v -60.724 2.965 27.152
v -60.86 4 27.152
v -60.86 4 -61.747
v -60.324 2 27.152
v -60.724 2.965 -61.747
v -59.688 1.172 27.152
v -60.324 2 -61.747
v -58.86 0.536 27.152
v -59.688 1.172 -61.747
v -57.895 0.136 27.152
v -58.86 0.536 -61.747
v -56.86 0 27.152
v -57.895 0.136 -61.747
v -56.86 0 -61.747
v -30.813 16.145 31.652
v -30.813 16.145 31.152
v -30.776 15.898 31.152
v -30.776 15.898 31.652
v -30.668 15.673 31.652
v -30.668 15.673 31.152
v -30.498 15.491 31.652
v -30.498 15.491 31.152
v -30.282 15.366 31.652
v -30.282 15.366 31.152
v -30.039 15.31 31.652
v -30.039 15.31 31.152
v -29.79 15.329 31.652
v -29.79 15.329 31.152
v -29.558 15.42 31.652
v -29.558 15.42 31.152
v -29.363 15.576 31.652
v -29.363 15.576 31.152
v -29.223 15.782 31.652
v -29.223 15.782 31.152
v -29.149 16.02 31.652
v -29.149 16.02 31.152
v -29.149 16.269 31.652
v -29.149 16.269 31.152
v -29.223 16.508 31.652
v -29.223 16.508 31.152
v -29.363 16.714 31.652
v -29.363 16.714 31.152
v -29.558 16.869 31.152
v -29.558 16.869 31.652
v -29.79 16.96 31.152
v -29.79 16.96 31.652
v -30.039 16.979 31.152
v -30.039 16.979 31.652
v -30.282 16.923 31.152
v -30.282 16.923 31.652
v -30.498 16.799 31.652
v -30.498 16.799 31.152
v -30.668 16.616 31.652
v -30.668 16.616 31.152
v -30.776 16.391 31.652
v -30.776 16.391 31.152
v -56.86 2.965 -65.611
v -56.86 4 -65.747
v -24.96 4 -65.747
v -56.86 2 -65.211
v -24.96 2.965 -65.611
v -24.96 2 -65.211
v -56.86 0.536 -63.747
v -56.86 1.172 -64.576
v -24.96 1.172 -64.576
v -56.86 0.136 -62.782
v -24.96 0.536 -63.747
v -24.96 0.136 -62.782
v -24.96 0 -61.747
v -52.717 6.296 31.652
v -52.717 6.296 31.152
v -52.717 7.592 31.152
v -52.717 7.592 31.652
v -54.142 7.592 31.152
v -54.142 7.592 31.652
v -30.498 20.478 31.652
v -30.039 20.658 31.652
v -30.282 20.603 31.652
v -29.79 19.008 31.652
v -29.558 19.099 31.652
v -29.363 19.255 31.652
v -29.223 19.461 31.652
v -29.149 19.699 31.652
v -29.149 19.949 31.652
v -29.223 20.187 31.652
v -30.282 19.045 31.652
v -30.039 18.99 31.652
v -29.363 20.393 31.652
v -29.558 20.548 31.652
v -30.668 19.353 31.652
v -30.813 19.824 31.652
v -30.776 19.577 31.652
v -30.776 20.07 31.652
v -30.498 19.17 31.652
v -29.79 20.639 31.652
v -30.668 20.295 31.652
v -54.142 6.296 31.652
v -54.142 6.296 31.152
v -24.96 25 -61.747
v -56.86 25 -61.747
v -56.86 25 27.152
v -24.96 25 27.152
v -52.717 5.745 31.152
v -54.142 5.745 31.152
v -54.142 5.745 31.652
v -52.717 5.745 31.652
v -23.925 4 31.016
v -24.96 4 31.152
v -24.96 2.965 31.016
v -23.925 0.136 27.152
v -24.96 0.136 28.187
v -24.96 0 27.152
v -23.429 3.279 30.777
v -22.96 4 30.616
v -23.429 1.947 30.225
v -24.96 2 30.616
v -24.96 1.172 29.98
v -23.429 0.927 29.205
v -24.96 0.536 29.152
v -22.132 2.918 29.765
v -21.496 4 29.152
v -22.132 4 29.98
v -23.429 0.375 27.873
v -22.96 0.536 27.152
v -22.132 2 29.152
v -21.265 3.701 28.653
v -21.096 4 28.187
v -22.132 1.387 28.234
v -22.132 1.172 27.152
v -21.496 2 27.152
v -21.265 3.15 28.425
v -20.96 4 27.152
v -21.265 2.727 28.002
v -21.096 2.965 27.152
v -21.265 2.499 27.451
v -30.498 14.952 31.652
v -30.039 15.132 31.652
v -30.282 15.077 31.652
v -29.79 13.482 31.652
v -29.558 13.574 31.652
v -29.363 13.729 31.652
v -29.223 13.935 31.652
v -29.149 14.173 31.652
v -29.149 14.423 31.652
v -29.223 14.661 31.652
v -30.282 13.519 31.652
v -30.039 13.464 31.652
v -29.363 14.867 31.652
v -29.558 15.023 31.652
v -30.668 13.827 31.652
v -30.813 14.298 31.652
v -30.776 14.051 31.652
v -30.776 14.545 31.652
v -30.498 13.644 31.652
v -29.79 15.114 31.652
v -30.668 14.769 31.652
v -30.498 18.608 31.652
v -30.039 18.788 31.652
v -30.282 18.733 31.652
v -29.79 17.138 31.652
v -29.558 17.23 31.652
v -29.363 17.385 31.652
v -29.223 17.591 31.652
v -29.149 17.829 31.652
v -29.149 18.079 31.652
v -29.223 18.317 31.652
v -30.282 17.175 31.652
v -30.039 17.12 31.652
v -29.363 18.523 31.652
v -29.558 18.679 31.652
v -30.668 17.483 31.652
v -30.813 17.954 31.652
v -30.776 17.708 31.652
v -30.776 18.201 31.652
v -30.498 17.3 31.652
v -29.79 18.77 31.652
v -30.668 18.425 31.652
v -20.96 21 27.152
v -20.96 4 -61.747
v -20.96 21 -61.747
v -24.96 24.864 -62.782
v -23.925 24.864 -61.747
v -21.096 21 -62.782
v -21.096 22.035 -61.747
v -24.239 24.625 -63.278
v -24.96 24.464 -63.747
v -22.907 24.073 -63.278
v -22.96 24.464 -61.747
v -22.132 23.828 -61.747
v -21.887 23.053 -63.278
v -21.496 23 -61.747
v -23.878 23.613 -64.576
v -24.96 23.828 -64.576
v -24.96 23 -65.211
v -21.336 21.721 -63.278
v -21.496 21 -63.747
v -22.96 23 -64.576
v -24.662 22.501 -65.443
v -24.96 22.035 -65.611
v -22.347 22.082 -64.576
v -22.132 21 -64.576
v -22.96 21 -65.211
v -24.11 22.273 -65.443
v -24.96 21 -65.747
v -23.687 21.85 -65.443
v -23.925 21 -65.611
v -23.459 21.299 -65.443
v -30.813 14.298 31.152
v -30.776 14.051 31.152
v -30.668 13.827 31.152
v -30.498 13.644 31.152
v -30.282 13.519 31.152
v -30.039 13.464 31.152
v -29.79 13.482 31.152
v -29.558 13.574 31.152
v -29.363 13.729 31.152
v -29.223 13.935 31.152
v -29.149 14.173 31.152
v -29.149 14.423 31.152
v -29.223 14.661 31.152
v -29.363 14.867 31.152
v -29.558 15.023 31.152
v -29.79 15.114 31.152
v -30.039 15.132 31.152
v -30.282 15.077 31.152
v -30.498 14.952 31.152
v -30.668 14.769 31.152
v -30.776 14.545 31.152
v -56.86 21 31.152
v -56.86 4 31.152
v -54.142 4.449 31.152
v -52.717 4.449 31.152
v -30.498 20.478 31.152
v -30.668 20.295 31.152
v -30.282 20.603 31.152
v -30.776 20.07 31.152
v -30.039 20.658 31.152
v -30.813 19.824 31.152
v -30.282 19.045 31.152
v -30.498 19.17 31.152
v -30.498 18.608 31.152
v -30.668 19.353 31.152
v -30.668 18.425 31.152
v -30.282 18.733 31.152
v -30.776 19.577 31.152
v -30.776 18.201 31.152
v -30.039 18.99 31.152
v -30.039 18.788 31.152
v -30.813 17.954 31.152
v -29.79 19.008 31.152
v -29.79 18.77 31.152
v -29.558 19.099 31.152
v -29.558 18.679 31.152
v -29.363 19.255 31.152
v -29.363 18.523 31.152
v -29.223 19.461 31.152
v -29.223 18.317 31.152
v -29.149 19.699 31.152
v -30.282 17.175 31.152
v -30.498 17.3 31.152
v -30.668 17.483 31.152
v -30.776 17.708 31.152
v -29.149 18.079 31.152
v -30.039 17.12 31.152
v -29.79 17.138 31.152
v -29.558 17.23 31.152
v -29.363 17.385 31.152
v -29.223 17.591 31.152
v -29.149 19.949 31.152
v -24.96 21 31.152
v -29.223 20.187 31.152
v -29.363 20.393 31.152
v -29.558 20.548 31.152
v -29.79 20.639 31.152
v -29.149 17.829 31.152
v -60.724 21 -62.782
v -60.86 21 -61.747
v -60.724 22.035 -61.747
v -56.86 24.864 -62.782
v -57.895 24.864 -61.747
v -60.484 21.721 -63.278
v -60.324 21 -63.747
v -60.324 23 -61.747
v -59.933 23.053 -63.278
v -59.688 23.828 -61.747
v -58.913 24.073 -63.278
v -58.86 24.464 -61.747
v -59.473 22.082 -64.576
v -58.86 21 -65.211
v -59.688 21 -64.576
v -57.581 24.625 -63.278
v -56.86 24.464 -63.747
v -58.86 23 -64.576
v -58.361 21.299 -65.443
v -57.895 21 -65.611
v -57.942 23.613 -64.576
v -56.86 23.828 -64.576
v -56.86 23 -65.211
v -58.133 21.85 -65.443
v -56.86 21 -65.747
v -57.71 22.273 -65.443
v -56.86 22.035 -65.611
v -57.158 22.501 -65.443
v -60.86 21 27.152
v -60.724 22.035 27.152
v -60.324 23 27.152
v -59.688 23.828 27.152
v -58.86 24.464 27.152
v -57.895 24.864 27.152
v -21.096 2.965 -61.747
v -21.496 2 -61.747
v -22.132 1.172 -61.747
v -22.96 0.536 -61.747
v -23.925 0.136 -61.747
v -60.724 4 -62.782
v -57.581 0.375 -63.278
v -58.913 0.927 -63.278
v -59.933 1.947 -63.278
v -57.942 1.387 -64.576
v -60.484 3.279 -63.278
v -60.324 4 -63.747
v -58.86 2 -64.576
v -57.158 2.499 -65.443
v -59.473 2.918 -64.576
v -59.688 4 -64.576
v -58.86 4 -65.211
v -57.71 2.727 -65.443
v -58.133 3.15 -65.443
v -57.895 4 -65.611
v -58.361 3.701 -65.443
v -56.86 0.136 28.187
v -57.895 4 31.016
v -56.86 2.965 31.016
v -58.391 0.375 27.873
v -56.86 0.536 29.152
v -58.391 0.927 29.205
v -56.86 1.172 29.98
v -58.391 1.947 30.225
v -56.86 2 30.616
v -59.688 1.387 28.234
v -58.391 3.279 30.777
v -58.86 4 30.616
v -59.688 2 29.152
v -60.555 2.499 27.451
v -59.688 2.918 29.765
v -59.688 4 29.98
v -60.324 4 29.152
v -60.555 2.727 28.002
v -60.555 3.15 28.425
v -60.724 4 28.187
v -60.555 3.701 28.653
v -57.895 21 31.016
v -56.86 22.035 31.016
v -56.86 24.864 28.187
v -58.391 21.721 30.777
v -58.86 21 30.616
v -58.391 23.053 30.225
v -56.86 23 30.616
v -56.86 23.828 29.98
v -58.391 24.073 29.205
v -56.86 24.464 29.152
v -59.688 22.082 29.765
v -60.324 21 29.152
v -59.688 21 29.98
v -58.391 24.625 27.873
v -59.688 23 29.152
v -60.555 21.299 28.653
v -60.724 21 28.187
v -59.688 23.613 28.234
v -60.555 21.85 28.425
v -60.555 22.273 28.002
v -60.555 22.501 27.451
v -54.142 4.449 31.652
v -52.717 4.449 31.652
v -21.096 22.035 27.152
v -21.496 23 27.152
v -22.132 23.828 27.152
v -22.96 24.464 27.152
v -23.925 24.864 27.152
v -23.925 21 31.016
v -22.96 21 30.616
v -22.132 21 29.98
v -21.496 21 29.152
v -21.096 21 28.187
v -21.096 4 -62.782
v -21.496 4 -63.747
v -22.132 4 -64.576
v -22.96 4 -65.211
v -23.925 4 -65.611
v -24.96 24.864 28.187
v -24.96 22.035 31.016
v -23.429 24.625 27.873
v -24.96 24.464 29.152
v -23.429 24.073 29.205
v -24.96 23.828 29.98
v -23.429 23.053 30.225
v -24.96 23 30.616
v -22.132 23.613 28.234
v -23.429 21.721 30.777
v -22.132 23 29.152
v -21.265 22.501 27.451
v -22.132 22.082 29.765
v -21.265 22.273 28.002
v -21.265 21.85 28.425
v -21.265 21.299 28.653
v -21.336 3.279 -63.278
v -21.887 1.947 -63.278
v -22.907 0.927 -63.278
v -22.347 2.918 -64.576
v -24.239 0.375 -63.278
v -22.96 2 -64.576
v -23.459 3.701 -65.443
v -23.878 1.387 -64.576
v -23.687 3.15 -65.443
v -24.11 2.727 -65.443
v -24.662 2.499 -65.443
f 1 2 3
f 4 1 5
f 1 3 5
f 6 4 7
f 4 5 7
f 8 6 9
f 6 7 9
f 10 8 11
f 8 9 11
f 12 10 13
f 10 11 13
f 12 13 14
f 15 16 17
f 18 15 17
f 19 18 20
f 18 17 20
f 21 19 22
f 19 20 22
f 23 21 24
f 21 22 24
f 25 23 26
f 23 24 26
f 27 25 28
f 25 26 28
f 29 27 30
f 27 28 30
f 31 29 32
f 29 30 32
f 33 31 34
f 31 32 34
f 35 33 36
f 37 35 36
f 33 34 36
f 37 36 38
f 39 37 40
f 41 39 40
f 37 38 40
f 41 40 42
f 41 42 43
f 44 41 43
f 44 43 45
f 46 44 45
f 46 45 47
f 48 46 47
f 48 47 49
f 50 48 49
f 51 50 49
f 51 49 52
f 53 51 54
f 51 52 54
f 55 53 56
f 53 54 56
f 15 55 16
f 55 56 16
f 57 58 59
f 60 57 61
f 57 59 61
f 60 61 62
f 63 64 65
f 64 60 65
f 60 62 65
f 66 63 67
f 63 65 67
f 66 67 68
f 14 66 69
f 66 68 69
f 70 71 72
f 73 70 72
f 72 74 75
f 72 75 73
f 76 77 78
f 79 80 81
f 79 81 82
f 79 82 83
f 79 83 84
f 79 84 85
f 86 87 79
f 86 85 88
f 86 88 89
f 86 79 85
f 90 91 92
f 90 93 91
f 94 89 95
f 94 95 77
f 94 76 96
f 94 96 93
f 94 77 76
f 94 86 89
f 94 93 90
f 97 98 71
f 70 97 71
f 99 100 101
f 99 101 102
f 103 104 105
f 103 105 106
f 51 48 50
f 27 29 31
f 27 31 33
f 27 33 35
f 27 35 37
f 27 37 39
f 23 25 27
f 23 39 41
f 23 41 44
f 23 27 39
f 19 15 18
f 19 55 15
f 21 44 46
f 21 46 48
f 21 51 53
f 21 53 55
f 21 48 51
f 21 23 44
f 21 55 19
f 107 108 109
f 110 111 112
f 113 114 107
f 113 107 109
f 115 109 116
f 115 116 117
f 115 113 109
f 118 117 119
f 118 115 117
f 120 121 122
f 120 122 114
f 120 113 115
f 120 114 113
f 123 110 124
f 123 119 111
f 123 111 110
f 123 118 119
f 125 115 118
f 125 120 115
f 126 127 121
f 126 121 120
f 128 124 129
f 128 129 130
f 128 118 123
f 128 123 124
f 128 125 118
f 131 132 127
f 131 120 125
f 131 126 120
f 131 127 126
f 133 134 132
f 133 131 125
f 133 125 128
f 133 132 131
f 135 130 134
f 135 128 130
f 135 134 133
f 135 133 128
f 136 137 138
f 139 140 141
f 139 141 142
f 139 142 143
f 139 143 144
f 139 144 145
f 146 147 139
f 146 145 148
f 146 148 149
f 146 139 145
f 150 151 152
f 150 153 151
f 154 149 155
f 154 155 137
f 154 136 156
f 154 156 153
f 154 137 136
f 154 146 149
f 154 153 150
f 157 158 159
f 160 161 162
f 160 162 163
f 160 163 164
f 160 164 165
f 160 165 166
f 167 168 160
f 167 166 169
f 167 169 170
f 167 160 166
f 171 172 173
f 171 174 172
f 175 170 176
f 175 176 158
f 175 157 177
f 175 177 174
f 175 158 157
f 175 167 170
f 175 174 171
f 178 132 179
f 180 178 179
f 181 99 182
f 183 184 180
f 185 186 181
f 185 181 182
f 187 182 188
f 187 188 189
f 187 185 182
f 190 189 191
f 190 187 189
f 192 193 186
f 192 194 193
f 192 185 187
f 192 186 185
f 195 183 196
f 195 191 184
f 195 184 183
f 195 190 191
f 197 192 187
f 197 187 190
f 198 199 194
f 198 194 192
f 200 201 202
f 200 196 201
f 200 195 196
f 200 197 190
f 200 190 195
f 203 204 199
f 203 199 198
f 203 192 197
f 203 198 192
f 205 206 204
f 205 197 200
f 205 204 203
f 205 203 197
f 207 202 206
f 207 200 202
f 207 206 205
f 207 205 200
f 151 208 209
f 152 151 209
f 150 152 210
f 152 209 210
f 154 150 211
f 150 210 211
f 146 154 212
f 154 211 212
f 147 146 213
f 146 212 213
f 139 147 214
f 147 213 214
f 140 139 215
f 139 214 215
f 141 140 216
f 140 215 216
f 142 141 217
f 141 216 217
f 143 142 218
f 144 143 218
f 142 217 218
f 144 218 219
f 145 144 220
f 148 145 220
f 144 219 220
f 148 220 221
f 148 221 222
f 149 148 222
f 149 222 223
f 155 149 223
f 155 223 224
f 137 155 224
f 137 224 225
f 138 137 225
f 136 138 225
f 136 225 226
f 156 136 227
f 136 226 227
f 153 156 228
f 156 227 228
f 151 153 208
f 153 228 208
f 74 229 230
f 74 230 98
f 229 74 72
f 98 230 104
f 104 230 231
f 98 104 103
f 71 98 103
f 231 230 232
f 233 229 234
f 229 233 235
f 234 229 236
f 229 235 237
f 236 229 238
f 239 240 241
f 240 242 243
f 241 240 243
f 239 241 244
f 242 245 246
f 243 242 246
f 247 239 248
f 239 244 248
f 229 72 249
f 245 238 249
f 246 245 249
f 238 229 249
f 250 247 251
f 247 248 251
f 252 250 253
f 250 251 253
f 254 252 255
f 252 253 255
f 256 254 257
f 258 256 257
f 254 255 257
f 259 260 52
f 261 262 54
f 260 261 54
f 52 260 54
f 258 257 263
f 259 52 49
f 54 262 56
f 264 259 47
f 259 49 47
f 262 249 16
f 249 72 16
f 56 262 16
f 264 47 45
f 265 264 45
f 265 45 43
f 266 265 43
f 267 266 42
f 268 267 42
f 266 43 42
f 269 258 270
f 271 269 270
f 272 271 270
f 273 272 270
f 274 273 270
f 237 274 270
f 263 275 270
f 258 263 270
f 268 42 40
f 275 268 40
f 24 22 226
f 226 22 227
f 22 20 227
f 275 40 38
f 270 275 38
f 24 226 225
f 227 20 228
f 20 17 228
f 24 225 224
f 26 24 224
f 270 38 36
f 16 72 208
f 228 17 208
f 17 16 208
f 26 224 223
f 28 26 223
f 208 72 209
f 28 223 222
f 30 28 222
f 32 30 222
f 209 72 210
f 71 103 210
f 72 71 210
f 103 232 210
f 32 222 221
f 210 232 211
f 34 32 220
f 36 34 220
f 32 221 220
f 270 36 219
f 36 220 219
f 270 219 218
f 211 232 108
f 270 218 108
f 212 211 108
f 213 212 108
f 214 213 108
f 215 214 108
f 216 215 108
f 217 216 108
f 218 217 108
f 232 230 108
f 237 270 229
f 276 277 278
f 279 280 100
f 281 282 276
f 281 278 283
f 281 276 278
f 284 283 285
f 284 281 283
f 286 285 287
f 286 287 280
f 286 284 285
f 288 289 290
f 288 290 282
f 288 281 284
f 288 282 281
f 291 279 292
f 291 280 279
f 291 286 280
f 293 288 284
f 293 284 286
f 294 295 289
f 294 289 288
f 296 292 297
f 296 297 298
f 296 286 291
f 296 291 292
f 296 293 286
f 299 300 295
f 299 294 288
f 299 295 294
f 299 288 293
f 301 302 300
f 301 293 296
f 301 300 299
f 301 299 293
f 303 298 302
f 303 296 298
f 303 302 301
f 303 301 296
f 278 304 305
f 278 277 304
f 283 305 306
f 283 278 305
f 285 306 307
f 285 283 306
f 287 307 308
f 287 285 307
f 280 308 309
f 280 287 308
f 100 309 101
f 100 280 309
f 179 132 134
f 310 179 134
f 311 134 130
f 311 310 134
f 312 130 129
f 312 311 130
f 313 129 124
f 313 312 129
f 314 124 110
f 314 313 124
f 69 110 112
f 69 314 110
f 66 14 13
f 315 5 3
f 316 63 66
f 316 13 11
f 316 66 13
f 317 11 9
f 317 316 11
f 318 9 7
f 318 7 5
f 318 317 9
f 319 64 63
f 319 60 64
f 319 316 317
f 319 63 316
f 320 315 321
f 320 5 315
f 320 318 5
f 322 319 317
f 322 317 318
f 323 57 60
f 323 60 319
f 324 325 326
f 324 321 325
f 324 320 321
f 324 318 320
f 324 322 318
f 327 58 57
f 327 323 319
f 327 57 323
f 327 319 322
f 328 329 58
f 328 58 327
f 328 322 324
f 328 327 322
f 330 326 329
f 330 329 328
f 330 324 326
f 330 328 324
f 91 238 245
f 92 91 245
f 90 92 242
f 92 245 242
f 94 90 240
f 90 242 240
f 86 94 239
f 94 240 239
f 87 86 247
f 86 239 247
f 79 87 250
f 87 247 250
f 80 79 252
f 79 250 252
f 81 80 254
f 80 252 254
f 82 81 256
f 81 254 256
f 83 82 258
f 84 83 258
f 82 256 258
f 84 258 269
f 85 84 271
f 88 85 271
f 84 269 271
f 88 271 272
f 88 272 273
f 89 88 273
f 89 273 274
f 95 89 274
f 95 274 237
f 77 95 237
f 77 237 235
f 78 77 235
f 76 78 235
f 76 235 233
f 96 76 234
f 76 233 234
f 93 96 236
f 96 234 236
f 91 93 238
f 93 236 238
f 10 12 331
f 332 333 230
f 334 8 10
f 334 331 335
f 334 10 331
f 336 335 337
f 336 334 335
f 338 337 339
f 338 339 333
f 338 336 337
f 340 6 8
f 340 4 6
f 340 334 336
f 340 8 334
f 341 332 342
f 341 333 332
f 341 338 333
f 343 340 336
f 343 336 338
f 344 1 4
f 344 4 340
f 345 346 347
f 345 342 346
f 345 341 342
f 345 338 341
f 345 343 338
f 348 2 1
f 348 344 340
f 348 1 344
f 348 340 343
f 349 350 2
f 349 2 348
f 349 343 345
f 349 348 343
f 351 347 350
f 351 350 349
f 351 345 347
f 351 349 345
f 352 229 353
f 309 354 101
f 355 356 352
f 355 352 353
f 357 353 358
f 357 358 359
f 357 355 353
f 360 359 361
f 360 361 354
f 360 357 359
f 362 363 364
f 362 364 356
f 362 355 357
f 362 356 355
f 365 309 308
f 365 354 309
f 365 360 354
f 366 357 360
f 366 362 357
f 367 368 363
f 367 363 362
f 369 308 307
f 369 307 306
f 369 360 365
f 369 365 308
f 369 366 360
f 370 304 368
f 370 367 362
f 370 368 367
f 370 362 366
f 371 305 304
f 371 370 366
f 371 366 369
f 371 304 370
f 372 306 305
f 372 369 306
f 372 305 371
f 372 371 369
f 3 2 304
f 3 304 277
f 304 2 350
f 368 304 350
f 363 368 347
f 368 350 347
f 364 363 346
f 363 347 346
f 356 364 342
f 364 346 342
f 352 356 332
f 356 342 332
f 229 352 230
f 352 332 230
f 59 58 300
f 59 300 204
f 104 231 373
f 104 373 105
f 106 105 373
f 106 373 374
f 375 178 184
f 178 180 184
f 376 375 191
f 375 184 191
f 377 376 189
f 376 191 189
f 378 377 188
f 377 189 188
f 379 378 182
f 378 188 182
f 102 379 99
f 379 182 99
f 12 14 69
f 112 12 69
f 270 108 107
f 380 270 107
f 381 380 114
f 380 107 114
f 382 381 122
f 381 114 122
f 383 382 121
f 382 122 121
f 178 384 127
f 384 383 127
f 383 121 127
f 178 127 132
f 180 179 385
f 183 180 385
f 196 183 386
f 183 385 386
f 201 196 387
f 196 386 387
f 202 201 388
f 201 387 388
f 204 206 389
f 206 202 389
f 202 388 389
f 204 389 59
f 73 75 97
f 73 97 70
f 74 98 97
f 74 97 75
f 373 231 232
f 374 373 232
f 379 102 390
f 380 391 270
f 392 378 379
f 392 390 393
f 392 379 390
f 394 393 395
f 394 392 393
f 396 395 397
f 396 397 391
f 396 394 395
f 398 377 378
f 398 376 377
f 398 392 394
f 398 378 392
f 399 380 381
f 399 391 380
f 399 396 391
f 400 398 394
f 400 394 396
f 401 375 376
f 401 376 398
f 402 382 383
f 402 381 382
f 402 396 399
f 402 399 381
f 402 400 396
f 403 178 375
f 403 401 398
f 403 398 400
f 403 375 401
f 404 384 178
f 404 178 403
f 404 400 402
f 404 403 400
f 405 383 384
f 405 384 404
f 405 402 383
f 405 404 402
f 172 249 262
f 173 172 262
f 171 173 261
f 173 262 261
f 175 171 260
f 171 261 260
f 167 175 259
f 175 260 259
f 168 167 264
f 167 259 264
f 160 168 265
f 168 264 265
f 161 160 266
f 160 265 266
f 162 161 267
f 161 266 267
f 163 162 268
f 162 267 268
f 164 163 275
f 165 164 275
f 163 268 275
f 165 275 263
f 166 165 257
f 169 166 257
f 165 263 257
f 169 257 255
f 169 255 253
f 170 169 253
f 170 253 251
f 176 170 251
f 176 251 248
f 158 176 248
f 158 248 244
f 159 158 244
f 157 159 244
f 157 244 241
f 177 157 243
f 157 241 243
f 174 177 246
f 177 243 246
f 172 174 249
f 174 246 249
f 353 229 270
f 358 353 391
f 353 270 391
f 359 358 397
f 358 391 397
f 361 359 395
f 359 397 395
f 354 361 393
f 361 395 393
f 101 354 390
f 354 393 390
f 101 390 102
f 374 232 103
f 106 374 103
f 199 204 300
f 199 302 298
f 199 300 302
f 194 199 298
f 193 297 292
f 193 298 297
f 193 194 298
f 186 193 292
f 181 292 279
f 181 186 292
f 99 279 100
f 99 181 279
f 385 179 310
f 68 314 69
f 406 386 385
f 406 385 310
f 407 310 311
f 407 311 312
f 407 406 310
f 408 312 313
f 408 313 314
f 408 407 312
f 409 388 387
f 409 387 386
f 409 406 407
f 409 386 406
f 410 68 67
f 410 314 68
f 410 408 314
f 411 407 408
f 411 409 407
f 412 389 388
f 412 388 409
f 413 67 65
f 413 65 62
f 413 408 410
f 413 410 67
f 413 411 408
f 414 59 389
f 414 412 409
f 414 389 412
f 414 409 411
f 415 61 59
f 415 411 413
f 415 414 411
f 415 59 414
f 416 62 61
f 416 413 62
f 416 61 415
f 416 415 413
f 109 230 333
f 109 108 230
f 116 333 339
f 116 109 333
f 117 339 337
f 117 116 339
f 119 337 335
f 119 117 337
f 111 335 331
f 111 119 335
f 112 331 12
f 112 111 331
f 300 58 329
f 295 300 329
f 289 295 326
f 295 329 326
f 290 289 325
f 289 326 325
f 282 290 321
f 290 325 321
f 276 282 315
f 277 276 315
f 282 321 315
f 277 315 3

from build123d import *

# Parameters (mm, degrees)
SKETCH1_W           = 39.899654891
SKETCH1_H           = 96.899161878
BOSS_EXTRUDE1_DEPTH = 25
FILLET4_R           = 4
FILLET5_R           = 4
SKETCH11_R          = 0.836574299
SKETCH11_W          = 1.425486882
SKETCH11_H          = 1.295897166
BOSS_EXTRUDE2_DEPTH = 0.5


with BuildPart() as part:
    # Sketch1 → Boss-Extrude1 (new body)
    with BuildSketch(Plane(origin=(0, 0, 0), x_dir=(1, 0, 0), z_dir=(0, 1, 0))):
        with Locations((-40.909991022, 17.297585728)):
            Rectangle(SKETCH1_W, SKETCH1_H)
    extrude(amount=BOSS_EXTRUDE1_DEPTH)

    # Fillet4
    fillet4_edges = [part.edges().sort_by_distance(p)[0] for p in [
        (-20.960163576, 25, -17.297585728),
        (-40.909991022, 25, -65.747166667),
        (-60.859818467, 25, -17.297585728),
        (-40.909991022, 0, -65.747166667),
        (-20.960163576, 0, -17.297585728),
        (-40.909991022, 0, 31.151995211),
        (-60.859818467, 0, -17.297585728),
        (-40.909991022, 25, 31.151995211),
    ]]
    fillet(fillet4_edges, radius=FILLET4_R)

    # Fillet5
    # the kernel refuses this fillet: 4 mm, written as the material it takes off along each edge
    with BuildSketch(Plane(origin=(-56.859818467, 4, -61.747166667), x_dir=(-1, 0, 0), z_dir=(0, 0, -1))) as fillet5_piece_1_section:
        Polygon((0, 0), (FILLET5_R, 0), (FILLET5_R, -FILLET5_R), (0, -FILLET5_R), align=None)
    fillet5_piece_1 = extrude(amount=FILLET5_R, mode=Mode.PRIVATE)
    fillet5_piece_1 = fillet5_piece_1 - Plane(origin=(-56.859818467, 4, -61.747166667), x_dir=(0.7071067811865475, 0.7071067811865475, 0), z_dir=(0, 0, -1)) * Sphere(FILLET5_R, mode=Mode.PRIVATE)
    add(fillet5_piece_1, mode=Mode.SUBTRACT)
    with BuildSketch(Plane(origin=(-24.960163576, 4, -61.747166667), x_dir=(1, 0, 0), z_dir=(0, 0, -1))) as fillet5_piece_2_section:
        Polygon((0, 0), (FILLET5_R, 0), (FILLET5_R, FILLET5_R), (0, FILLET5_R), align=None)
    fillet5_piece_2 = extrude(amount=FILLET5_R, mode=Mode.PRIVATE)
    fillet5_piece_2 = fillet5_piece_2 - Plane(origin=(-24.960163576, 4, -61.747166667), x_dir=(-0.7071067811865475, 0.7071067811865475, 0), z_dir=(0, 0, -1)) * Sphere(FILLET5_R, mode=Mode.PRIVATE)
    add(fillet5_piece_2, mode=Mode.SUBTRACT)
    with BuildSketch(Plane(origin=(-56.859818467, 4, 27.151995211), x_dir=(0, 0, 1), z_dir=(-1, 0, 0))) as fillet5_piece_3_section:
        Polygon((0, 0), (FILLET5_R, 0), (FILLET5_R, -FILLET5_R), (0, -FILLET5_R), align=None)
    fillet5_piece_3 = extrude(amount=FILLET5_R, mode=Mode.PRIVATE)
    fillet5_piece_3 = fillet5_piece_3 - Plane(origin=(-56.859818467, 4, 27.151995211), x_dir=(0, 0.7071067811865475, -0.7071067811865475), z_dir=(-1, 0, 0)) * Sphere(FILLET5_R, mode=Mode.PRIVATE)
    add(fillet5_piece_3, mode=Mode.SUBTRACT)
    with BuildSketch(Plane(origin=(-24.960163576, 4, 27.151995211), x_dir=(0, 0, 1), z_dir=(1, 0, 0))) as fillet5_piece_4_section:
        Polygon((0, 0), (FILLET5_R, 0), (FILLET5_R, FILLET5_R), (0, FILLET5_R), align=None)
    fillet5_piece_4 = extrude(amount=FILLET5_R, mode=Mode.PRIVATE)
    fillet5_piece_4 = fillet5_piece_4 - Plane(origin=(-24.960163576, 4, 27.151995211), x_dir=(0, 0.7071067811865475, -0.7071067811865475), z_dir=(1, 0, 0)) * Sphere(FILLET5_R, mode=Mode.PRIVATE)
    add(fillet5_piece_4, mode=Mode.SUBTRACT)
    with BuildSketch(Plane(origin=(-24.960163576, 21, 27.151995211), x_dir=(0, 0, 1), z_dir=(1, 0, 0))) as fillet5_piece_5_section:
        Polygon((0, 0), (FILLET5_R, 0), (FILLET5_R, -FILLET5_R), (0, -FILLET5_R), align=None)
    fillet5_piece_5 = extrude(amount=FILLET5_R, mode=Mode.PRIVATE)
    fillet5_piece_5 = fillet5_piece_5 - Plane(origin=(-24.960163576, 21, 27.151995211), x_dir=(0, -0.7071067811865475, -0.7071067811865475), z_dir=(1, 0, 0)) * Sphere(FILLET5_R, mode=Mode.PRIVATE)
    add(fillet5_piece_5, mode=Mode.SUBTRACT)
    with BuildSketch(Plane(origin=(-56.859818467, 21, 27.151995211), x_dir=(0, 0, 1), z_dir=(-1, 0, 0))) as fillet5_piece_6_section:
        Polygon((0, 0), (FILLET5_R, 0), (FILLET5_R, FILLET5_R), (0, FILLET5_R), align=None)
    fillet5_piece_6 = extrude(amount=FILLET5_R, mode=Mode.PRIVATE)
    fillet5_piece_6 = fillet5_piece_6 - Plane(origin=(-56.859818467, 21, 27.151995211), x_dir=(0, -0.7071067811865475, -0.7071067811865475), z_dir=(-1, 0, 0)) * Sphere(FILLET5_R, mode=Mode.PRIVATE)
    add(fillet5_piece_6, mode=Mode.SUBTRACT)
    with BuildSketch(Plane(origin=(-24.960163576, 21, -61.747166667), x_dir=(1, 0, 0), z_dir=(0, 0, -1))) as fillet5_piece_7_section:
        Polygon((0, 0), (FILLET5_R, 0), (FILLET5_R, -FILLET5_R), (0, -FILLET5_R), align=None)
    fillet5_piece_7 = extrude(amount=FILLET5_R, mode=Mode.PRIVATE)
    fillet5_piece_7 = fillet5_piece_7 - Plane(origin=(-24.960163576, 21, -61.747166667), x_dir=(-0.7071067811865475, -0.7071067811865475, 0), z_dir=(0, 0, -1)) * Sphere(FILLET5_R, mode=Mode.PRIVATE)
    add(fillet5_piece_7, mode=Mode.SUBTRACT)
    with BuildSketch(Plane(origin=(-56.859818467, 21, -61.747166667), x_dir=(-1, 0, 0), z_dir=(0, 0, -1))) as fillet5_piece_8_section:
        Polygon((0, 0), (FILLET5_R, 0), (FILLET5_R, FILLET5_R), (0, FILLET5_R), align=None)
    fillet5_piece_8 = extrude(amount=FILLET5_R, mode=Mode.PRIVATE)
    fillet5_piece_8 = fillet5_piece_8 - Plane(origin=(-56.859818467, 21, -61.747166667), x_dir=(0.7071067811865475, -0.7071067811865475, 0), z_dir=(0, 0, -1)) * Sphere(FILLET5_R, mode=Mode.PRIVATE)
    add(fillet5_piece_8, mode=Mode.SUBTRACT)
    with BuildSketch(Plane(origin=(-20.960163576, 4, 31.151995211), x_dir=(0, 0, -1), z_dir=(0, 1, 0)), Plane(origin=(-20.960163576, 4, -65.747166667), x_dir=(-1, 0, 0), z_dir=(0, 1, 0))) as fillet5_piece_9:
        with BuildLine():
            CenterArc((FILLET5_R, FILLET5_R), FILLET5_R, 180, 90)
            Line((0, FILLET5_R), (0, 0))
            Line((0, 0), (FILLET5_R, 0))
        make_face()
    extrude(amount=17, mode=Mode.SUBTRACT)
    with BuildSketch(Plane(origin=(-60.859818467, 4, 31.151995211), x_dir=(0, 0, -1), z_dir=(0, 1, 0)), Plane(origin=(-60.859818467, 4, -65.747166667), x_dir=(1, 0, 0), z_dir=(0, 1, 0))) as fillet5_piece_10:
        with BuildLine():
            CenterArc((FILLET5_R, -FILLET5_R), FILLET5_R, 90, 90)
            Line((0, -FILLET5_R), (0, 0))
            Line((0, 0), (FILLET5_R, 0))
        make_face()
    extrude(amount=17, mode=Mode.SUBTRACT)

    # Sketch11 → Boss-Extrude2 (add)
    with BuildSketch(Plane.XY.offset(31.151995211)):
        with Locations(Location((-29.976452447, 19.823866424, 0), (0, 0, 180))):
            Circle(SKETCH11_R)
        with Locations(Location((-29.976452447, 17.95408771, 0), (0, 0, 180))):
            Circle(SKETCH11_R)
        with Locations(Location((-29.976452447, 14.298065843, 0), (0, 0, 180))):
            Circle(SKETCH11_R)
        with Locations(Location((-29.976452447, 16.144719304, 0), (0, 0, 180))):
            Circle(SKETCH11_R)
        with Locations((-53.429405659, 5.097195967)):
            Rectangle(SKETCH11_W, SKETCH11_H)
        with Locations((-53.429405659, 6.943849428)):
            Rectangle(SKETCH11_W, SKETCH11_H)
    extrude(amount=BOSS_EXTRUDE2_DEPTH)


solid = part.part
